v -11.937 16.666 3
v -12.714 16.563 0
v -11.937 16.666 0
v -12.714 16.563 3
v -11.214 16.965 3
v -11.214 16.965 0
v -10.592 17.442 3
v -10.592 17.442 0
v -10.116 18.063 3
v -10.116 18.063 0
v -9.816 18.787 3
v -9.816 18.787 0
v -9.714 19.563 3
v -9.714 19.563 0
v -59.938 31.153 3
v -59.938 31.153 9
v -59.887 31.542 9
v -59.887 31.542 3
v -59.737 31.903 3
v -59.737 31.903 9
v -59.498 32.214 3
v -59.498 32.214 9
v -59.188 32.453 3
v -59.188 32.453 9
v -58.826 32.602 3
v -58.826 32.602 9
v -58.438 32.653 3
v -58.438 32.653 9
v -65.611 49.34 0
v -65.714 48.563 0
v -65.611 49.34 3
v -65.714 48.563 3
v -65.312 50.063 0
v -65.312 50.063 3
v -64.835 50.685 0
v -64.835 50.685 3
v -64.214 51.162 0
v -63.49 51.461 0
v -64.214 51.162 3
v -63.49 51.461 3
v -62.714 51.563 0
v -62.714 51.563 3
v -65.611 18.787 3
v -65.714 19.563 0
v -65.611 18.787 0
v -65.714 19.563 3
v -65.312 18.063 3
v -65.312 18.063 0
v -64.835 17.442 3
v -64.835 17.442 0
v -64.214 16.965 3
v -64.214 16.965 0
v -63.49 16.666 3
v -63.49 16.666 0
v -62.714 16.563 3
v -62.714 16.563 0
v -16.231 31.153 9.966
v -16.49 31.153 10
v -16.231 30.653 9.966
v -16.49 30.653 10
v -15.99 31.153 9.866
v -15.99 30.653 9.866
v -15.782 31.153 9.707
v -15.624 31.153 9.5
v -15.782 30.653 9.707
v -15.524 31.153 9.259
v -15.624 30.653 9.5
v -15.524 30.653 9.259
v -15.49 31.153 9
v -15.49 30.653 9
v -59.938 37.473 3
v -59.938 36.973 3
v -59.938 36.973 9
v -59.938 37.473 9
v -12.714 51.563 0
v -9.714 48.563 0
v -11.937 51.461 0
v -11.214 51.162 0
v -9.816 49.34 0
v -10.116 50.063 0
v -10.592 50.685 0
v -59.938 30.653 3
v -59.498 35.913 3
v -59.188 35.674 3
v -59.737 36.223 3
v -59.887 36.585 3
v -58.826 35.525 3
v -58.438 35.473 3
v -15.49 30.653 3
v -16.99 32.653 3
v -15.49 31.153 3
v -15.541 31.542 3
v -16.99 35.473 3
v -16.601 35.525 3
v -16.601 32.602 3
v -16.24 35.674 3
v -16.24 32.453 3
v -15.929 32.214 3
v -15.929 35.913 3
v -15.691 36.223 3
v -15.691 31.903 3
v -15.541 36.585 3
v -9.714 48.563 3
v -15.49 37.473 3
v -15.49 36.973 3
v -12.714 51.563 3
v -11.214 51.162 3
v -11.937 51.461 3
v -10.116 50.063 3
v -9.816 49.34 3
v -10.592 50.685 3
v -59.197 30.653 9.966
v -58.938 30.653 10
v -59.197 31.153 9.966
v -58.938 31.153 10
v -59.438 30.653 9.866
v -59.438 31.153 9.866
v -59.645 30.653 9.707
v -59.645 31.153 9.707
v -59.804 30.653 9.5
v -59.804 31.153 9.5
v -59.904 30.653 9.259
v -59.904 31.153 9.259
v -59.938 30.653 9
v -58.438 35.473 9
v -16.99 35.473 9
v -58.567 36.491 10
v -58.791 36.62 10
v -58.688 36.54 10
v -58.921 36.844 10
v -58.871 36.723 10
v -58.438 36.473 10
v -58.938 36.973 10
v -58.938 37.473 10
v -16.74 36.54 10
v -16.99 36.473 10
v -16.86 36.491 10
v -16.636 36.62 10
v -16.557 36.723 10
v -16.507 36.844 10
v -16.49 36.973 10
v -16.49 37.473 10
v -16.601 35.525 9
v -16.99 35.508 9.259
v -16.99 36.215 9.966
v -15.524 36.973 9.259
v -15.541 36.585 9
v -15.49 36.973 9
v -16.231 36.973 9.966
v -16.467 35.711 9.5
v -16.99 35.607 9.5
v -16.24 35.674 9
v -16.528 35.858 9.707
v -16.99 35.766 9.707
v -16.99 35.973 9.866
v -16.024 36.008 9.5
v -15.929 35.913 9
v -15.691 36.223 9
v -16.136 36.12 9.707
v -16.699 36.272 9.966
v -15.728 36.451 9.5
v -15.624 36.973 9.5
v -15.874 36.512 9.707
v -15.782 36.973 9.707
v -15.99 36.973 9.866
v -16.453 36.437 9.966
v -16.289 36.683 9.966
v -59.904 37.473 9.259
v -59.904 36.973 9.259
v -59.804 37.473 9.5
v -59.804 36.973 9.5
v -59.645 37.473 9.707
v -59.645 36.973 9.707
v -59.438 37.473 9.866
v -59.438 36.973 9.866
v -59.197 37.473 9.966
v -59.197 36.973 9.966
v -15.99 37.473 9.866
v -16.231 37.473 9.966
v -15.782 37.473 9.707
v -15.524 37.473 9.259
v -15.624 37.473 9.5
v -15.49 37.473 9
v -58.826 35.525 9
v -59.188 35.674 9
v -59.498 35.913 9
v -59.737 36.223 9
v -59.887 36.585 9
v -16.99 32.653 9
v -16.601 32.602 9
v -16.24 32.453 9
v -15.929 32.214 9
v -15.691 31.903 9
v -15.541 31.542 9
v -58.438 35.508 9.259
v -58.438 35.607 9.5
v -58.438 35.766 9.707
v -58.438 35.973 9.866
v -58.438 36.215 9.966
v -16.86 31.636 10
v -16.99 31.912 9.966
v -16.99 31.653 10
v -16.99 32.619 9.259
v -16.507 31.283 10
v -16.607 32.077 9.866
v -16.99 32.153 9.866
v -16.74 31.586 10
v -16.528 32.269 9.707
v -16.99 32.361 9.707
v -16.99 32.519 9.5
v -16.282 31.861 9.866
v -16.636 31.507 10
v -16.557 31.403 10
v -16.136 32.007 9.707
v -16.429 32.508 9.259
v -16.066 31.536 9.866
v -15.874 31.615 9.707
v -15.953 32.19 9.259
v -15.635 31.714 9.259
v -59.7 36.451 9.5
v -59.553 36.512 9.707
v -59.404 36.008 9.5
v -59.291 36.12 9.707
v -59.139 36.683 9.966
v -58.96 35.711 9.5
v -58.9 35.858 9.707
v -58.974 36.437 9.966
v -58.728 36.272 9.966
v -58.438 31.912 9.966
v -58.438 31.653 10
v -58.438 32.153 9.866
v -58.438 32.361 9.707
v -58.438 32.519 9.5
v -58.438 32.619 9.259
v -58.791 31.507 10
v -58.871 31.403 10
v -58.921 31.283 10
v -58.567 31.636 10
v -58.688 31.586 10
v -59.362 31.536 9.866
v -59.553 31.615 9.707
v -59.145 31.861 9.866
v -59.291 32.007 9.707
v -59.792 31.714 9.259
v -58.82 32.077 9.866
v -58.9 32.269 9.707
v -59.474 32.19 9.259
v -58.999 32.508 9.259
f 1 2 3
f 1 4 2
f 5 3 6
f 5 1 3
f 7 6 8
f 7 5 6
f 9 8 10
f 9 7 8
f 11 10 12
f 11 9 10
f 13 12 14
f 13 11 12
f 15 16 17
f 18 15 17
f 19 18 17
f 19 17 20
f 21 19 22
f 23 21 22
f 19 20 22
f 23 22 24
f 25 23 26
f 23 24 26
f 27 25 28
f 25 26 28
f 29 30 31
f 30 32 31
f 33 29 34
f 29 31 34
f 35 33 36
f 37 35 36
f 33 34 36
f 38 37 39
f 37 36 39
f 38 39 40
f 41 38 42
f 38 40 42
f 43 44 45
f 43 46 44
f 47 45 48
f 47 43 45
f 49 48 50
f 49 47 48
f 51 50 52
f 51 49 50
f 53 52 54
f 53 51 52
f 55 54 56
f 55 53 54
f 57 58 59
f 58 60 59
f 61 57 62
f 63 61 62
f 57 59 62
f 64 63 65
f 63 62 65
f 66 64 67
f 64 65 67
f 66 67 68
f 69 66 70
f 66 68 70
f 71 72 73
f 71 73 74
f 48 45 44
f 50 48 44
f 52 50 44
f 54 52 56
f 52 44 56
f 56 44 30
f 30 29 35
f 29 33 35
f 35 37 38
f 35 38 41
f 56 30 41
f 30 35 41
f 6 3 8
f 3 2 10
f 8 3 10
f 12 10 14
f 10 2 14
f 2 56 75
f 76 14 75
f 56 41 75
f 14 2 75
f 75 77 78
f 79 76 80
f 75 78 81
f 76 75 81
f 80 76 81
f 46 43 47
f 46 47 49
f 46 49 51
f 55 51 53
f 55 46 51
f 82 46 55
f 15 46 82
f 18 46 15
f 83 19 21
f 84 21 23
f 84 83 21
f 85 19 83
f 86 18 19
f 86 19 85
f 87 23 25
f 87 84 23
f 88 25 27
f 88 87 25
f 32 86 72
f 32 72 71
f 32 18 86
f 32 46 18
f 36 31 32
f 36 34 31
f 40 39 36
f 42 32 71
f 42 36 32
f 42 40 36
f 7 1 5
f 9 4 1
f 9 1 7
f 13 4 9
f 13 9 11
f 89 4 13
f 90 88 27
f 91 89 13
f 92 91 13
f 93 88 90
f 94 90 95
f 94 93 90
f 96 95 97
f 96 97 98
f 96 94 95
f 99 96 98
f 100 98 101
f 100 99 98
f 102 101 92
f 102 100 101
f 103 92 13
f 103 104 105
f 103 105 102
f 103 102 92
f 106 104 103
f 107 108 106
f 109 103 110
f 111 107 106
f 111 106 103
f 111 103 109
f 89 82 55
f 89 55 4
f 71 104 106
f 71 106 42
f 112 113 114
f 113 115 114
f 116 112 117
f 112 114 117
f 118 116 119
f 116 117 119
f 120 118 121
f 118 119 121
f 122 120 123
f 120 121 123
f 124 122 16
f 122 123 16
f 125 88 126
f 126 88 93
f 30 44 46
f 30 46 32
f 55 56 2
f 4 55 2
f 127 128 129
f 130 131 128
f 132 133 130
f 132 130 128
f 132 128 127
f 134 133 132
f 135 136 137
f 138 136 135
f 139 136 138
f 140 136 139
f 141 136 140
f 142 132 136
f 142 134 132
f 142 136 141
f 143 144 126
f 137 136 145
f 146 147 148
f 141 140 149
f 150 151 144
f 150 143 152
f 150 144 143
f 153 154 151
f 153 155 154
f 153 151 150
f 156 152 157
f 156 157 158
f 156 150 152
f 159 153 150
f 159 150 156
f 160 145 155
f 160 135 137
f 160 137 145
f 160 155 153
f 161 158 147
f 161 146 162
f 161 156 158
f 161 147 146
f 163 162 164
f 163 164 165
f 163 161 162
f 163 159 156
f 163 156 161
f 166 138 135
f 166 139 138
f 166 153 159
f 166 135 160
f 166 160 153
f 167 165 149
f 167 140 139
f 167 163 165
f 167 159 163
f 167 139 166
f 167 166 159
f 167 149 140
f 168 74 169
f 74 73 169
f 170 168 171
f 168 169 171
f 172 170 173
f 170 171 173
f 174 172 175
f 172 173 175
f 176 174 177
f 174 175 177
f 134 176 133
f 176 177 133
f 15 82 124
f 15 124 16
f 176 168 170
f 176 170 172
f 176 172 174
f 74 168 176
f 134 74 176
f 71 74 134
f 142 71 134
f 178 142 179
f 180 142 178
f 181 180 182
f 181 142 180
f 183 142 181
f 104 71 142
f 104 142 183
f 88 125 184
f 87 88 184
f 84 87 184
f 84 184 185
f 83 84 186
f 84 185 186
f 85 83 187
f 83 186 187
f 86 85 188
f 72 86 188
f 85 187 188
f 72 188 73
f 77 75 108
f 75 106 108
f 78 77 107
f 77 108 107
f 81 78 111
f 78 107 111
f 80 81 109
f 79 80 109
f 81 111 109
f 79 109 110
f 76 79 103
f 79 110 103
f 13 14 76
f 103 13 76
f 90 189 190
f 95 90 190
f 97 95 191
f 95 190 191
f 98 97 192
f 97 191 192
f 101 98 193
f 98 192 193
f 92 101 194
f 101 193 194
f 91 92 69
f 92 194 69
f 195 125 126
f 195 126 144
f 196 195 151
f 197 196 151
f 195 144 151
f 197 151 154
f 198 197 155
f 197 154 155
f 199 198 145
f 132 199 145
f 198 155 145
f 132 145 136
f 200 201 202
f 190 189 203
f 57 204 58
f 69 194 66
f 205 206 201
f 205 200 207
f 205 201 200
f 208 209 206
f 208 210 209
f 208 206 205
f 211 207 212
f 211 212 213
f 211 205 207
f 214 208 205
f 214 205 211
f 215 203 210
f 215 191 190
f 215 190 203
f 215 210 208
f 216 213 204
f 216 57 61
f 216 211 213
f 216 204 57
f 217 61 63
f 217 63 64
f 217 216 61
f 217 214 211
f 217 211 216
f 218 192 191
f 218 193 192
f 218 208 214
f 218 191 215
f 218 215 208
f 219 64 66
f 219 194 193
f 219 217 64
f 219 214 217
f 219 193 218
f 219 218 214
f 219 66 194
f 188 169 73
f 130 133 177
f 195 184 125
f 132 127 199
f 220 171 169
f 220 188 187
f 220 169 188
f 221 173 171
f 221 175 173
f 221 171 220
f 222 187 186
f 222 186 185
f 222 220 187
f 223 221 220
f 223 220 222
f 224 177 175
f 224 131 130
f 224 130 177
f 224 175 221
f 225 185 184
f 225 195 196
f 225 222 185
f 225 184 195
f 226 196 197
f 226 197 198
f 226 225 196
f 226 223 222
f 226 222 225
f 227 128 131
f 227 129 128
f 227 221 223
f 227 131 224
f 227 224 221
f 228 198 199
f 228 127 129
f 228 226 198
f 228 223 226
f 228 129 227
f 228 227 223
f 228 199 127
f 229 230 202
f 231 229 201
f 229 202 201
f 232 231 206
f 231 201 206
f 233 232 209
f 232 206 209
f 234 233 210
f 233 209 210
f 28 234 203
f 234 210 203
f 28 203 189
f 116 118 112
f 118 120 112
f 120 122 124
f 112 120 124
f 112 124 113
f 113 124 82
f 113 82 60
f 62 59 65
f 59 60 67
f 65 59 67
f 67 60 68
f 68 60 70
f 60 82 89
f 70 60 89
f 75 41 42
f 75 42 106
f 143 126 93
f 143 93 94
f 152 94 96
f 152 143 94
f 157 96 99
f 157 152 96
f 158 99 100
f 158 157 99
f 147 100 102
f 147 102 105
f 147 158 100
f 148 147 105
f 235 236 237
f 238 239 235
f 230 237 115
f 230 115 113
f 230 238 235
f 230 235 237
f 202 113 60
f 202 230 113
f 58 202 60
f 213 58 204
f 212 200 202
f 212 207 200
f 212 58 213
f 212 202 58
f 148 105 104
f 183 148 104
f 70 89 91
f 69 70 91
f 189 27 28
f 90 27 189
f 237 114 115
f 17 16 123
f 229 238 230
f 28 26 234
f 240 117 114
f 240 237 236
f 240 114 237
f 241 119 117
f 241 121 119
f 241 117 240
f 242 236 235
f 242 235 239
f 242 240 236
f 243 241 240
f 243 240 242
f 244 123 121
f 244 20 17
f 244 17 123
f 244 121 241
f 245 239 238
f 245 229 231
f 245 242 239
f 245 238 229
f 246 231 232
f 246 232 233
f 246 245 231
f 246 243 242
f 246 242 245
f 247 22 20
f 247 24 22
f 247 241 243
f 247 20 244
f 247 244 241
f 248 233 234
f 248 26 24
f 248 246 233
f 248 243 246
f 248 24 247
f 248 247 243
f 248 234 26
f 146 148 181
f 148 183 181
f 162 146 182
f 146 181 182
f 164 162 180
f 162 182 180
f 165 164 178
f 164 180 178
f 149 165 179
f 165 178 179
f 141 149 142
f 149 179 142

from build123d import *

# Parameters (mm, degrees)
F0_W     = 56
F0_H     = 35
F0_W_2   = 44.448143
F0_H_2   = 2
F1_DEPTH = 3
F2_DEPTH = 10
F3_R     = 1.5
F4_R     = 1
F5_R     = 3


with BuildPart() as f1:
    # F0 (on Top) → F1 (new body)
    with BuildSketch(Plane.XY):
        with Locations((-37.713654, 34.063472)):
            Rectangle(F0_W, F0_H)
        with Locations((-37.713654, 31.653472)):
            Rectangle(F0_W_2, F0_H_2, mode=Mode.SUBTRACT)
        with Locations((-37.713654, 36.473472)):
            Rectangle(F0_W_2, F0_H_2, mode=Mode.SUBTRACT)
    extrude(amount=F1_DEPTH)

    # F0 (on Top) → F2 (join)
    with BuildSketch(Plane.XY):
        with Locations((-37.713654, 31.653472)):
            Rectangle(F0_W_2, F0_H_2)
        with Locations((-37.713654, 36.473472)):
            Rectangle(F0_W_2, F0_H_2)
    extrude(amount=F2_DEPTH)

    # F3
    f3_edges = [f1.edges().sort_by_distance(p)[0] for p in [
        (-59.937726, 35.473472, 6.5),
        (-59.937726, 32.653472, 6.5),
        (-15.489583, 35.473472, 6.5),
        (-15.489583, 32.653472, 6.5),
    ]]
    fillet(f3_edges, radius=F3_R)

    # F4
    f4_edges = [f1.edges().sort_by_distance(p)[0] for p in [
        (-37.713654, 35.473472, 10),
        (-37.713654, 32.653472, 10),
    ]]
    fillet(f4_edges, radius=F4_R)

    # F5
    f5_edges = [f1.edges().sort_by_distance(p)[0] for p in [
        (-9.713654, 51.563472, 1.5),
        (-65.713654, 16.563472, 1.5),
        (-65.713654, 51.563472, 1.5),
        (-9.713654, 16.563472, 1.5),
    ]]
    fillet(f5_edges, radius=F5_R)


solid = f1.part
